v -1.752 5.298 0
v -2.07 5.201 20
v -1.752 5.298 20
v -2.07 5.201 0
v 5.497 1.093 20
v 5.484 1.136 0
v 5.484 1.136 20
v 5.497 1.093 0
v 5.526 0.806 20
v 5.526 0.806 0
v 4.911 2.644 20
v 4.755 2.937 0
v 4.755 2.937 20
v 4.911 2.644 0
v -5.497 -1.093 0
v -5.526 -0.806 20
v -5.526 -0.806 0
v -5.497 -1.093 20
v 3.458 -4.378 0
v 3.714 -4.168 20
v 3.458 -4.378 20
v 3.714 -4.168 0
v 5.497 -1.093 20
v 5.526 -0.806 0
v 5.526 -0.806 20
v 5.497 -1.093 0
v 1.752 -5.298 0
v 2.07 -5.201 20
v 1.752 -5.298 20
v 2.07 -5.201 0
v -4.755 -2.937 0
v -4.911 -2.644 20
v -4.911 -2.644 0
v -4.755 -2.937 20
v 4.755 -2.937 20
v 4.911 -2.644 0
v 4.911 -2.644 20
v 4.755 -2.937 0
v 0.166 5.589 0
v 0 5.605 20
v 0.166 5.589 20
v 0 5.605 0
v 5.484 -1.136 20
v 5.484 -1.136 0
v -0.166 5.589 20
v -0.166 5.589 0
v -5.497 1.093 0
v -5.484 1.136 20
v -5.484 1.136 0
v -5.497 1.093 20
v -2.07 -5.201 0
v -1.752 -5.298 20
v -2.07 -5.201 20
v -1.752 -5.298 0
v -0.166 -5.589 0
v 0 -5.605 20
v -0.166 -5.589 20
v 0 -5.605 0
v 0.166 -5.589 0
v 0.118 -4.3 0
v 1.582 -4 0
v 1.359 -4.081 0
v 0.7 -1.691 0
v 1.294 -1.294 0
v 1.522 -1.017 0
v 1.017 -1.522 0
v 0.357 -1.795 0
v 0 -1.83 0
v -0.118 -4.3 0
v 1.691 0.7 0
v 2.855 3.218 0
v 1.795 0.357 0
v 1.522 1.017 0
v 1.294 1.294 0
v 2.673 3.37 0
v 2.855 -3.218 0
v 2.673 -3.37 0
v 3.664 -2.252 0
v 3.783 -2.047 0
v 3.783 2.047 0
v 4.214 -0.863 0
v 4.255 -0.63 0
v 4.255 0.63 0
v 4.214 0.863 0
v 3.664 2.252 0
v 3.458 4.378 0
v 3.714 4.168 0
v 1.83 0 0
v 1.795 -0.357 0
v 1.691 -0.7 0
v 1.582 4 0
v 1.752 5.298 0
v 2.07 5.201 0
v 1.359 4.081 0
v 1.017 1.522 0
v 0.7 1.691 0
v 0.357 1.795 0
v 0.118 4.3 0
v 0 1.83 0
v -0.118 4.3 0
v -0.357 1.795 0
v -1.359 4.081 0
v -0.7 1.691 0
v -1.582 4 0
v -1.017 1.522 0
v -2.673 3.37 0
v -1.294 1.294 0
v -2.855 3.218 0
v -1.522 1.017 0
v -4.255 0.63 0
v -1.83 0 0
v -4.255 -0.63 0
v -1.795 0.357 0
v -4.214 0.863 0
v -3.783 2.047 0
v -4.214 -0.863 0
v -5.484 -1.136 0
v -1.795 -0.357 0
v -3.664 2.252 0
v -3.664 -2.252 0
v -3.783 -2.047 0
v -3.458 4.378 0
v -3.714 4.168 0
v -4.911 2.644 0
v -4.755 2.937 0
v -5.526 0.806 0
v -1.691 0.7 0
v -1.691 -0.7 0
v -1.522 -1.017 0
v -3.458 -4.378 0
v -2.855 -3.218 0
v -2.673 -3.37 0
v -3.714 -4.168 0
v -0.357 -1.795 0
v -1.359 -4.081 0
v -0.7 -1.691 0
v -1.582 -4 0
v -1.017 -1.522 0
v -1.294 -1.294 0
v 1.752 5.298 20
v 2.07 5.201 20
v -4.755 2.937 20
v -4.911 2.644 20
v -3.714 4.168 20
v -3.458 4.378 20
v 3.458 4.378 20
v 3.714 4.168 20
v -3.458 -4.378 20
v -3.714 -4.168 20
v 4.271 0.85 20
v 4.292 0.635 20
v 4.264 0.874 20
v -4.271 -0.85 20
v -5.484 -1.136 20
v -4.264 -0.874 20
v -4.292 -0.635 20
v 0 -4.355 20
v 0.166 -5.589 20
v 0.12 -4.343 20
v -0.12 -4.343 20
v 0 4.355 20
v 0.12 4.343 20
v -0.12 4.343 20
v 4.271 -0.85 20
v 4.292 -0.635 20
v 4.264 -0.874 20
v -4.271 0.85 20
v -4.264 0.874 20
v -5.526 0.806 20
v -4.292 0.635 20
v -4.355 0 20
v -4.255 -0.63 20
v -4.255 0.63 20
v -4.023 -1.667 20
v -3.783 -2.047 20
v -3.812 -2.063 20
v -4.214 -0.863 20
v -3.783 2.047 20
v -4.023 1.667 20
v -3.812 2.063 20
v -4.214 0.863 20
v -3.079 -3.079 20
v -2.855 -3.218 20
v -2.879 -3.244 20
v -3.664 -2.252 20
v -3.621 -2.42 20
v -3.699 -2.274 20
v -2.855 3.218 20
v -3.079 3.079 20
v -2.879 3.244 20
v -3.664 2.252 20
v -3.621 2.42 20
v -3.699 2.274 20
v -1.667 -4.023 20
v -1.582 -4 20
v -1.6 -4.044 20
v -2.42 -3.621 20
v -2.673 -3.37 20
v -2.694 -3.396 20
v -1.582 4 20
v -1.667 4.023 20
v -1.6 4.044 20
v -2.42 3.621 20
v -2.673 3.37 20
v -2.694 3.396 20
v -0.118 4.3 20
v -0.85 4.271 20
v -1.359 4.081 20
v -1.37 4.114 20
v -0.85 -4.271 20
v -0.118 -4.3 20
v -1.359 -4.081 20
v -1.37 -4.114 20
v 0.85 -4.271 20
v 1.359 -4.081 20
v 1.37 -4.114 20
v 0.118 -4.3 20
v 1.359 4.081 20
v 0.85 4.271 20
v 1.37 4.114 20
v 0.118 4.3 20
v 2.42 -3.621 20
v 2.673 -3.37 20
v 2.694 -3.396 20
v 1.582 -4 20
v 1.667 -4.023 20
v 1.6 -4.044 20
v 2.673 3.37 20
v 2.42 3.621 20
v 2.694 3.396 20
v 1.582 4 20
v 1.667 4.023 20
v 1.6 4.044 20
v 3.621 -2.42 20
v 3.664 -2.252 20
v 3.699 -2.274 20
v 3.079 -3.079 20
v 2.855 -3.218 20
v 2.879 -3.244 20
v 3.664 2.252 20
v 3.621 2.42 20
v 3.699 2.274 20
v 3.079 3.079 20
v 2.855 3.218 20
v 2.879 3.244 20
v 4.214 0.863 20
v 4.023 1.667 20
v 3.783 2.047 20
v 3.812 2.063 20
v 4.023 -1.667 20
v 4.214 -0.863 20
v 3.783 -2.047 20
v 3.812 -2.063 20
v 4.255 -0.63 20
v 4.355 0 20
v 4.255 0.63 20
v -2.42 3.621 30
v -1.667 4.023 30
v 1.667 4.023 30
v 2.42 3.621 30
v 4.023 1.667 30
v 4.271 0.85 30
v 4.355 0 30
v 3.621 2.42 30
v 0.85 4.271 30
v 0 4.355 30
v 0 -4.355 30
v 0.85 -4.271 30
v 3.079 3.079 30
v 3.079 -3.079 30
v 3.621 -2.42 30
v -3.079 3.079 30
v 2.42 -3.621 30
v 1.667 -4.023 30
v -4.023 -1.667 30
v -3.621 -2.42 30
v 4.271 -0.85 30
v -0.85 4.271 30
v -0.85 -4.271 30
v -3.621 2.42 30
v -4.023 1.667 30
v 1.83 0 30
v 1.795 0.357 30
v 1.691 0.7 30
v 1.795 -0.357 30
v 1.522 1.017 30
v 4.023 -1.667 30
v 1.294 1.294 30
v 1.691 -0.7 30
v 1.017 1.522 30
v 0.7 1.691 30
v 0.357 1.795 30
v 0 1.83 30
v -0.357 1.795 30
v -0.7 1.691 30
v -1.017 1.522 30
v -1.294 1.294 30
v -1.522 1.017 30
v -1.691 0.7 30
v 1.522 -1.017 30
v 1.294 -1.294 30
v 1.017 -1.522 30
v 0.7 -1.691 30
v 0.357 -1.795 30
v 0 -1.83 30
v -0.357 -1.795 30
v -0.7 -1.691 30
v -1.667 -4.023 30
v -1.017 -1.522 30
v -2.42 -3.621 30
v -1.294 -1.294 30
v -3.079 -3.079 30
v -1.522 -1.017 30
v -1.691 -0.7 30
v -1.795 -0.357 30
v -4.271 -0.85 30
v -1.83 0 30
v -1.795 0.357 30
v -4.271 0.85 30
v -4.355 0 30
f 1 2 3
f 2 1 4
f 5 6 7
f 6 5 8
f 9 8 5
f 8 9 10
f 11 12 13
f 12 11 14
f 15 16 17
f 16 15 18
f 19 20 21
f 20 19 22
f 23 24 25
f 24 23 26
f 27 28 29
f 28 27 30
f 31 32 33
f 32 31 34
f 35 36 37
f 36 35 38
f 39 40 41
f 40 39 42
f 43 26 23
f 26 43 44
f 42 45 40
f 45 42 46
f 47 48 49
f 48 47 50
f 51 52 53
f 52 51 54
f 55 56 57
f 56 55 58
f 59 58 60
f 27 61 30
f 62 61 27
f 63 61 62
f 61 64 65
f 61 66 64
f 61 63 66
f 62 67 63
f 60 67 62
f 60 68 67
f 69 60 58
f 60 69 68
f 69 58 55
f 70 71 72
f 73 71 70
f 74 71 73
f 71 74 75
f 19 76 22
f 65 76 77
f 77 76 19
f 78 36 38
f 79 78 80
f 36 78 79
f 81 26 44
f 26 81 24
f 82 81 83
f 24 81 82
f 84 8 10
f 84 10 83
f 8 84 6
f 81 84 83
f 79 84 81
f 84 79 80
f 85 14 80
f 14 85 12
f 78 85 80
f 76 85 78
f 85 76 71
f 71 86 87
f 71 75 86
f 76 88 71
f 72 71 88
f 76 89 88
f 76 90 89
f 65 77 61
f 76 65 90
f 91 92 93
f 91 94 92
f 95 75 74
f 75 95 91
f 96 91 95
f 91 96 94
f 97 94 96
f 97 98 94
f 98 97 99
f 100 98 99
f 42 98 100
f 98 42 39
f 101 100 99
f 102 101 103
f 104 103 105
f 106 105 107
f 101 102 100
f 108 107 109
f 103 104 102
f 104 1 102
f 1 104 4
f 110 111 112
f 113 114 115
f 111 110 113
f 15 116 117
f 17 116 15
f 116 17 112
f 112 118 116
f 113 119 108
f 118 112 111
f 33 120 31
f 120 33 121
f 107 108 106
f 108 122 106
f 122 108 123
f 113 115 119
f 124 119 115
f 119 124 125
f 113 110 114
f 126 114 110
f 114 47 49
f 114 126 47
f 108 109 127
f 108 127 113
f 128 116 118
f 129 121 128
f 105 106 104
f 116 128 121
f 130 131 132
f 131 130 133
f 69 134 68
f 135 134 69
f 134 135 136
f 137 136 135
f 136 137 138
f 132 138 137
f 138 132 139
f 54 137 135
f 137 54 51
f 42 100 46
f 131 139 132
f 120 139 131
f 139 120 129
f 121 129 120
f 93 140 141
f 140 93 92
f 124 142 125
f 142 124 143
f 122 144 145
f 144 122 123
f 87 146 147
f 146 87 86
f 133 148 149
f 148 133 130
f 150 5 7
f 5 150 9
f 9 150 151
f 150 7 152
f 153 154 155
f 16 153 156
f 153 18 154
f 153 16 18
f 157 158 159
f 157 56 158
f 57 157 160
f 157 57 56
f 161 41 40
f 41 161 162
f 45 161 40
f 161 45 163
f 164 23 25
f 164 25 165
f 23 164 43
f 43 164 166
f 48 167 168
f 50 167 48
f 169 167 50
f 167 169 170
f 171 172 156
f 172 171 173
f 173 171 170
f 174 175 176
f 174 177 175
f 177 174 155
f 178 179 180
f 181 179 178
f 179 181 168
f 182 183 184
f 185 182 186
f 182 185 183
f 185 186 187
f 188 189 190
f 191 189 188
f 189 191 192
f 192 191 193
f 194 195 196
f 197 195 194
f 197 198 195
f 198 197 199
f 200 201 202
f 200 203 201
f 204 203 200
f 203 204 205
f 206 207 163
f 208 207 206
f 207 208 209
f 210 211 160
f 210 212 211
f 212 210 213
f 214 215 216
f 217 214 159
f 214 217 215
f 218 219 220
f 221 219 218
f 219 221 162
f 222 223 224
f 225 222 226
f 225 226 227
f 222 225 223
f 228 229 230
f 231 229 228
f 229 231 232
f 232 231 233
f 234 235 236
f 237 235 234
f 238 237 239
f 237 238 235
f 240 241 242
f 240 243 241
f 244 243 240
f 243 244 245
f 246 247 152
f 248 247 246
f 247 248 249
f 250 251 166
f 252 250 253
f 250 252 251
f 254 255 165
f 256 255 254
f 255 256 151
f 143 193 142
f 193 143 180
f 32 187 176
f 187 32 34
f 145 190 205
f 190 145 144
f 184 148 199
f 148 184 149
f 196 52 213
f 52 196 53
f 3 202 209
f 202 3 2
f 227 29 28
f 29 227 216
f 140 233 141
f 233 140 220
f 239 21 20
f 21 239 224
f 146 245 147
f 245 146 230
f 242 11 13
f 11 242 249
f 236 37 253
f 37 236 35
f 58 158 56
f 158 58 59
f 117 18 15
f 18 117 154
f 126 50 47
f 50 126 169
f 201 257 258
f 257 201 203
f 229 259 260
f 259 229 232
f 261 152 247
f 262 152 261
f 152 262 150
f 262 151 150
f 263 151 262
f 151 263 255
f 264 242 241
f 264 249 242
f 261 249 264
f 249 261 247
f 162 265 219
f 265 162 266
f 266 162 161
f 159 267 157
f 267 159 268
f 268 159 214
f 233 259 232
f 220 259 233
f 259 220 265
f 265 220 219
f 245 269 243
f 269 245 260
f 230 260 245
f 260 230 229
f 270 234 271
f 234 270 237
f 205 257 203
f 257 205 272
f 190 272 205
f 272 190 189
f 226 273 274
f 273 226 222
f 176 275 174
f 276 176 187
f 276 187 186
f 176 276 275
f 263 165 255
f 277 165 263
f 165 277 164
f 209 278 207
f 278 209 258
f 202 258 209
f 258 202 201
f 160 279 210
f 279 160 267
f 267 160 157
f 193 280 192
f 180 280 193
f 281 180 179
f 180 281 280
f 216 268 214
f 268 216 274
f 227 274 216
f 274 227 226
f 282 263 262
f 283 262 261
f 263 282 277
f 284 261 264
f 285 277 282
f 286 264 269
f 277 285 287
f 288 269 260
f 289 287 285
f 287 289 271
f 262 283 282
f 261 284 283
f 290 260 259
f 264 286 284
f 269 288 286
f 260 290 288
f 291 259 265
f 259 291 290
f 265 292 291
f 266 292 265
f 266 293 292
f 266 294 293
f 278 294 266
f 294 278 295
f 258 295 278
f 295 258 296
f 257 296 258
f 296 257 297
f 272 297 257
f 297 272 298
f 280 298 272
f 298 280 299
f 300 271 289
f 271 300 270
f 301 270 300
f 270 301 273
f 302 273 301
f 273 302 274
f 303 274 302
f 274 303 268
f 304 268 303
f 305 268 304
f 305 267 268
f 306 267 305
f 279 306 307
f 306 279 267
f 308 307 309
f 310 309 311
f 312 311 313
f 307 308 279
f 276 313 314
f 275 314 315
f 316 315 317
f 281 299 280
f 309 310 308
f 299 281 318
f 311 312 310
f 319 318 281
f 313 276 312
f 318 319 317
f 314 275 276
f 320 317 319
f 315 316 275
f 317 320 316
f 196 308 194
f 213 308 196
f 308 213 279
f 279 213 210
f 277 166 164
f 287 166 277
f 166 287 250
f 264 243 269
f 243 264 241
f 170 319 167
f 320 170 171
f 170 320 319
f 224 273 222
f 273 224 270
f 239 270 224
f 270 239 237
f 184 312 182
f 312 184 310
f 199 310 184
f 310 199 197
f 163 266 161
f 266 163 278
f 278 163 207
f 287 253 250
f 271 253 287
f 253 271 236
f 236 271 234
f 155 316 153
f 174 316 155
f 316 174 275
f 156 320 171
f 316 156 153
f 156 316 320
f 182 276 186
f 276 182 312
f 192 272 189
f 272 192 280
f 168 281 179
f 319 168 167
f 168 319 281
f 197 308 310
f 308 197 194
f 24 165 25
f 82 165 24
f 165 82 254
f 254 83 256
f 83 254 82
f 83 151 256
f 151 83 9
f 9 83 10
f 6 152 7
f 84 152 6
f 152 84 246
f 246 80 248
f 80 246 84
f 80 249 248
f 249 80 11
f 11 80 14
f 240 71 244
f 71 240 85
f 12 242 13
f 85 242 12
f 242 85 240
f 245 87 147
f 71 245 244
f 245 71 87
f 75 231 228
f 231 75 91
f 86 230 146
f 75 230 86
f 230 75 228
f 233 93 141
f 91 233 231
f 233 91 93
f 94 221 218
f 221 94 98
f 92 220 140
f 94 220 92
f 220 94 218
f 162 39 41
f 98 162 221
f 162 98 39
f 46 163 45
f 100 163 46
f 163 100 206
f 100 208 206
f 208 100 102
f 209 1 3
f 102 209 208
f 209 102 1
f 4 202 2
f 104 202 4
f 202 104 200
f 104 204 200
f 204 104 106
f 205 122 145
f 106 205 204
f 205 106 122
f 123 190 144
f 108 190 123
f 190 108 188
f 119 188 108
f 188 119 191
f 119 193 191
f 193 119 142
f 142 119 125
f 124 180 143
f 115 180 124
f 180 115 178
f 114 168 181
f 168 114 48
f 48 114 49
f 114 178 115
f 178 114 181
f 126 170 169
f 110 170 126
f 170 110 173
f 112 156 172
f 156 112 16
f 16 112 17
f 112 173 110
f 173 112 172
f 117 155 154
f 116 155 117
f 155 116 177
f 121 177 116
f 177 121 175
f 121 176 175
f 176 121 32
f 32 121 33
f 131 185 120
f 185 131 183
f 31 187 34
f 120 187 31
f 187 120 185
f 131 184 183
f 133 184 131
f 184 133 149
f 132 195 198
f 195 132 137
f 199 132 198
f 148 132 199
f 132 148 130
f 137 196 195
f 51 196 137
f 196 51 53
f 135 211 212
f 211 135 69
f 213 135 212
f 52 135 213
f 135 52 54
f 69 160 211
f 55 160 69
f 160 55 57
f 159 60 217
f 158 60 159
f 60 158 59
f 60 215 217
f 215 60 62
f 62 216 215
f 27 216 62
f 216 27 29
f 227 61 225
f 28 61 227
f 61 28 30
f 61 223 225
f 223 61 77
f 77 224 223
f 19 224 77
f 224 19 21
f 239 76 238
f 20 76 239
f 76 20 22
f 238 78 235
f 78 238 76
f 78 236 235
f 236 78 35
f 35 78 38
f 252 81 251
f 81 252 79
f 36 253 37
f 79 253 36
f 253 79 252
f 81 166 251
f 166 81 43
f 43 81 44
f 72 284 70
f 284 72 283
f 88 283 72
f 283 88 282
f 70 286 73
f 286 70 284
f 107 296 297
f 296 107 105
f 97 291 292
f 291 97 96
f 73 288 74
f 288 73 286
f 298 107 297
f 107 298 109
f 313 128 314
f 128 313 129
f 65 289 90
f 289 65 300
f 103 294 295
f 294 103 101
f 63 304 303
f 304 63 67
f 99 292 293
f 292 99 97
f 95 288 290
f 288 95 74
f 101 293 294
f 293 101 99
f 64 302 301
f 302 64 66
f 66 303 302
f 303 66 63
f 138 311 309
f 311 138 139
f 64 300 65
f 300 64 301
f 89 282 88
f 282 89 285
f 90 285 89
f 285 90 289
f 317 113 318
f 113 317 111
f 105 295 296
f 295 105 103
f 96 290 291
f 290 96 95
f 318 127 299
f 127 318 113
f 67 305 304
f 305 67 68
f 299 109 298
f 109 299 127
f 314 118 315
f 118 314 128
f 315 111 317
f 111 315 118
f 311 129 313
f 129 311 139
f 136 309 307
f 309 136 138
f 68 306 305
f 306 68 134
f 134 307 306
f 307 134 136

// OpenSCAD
$fn = 32;

// ----------------------------------------------------------------------
// Timing pulley: GT2 18T, pitch 2 mm, 11.21 mm x 30 mm
// ----------------------------------------------------------------------

// --- parameters (mm) ---
pitch_mm = 2;             // belt pitch
tooth_count = 18;         // number of grooves
width = 20;               // belt width between the flanges
tip_d = 11.21;            // tip circle diameter
root_d = 9.71;            // groove bottom diameter
groove_h = 0.75;          // groove depth
tooth_w = 1.5;            // groove width at the tip circle
hub_bore = 3.66;          // shaft bore
hub_d = 8.71;             // hub diameter
hub_h = 10;               // hub above the flange
bottom_z = 0;             // lowest point of the pulley
top_z = 30;               // highest point of the pulley

module rim() {
  cylinder(h = width, d = tip_d);
}

module groove_cutter() {
  /* belt tooth groove: deeper than wide, cut through the belt width */
  translate([root_d / 2, 0, 0])
    linear_extrude(height = width)
      polygon(points = [[-0.6, -tooth_w * 0.42], [groove_h + 0.6, -tooth_w * 0.6],
                        [groove_h + 0.6, tooth_w * 0.6], [-0.6, tooth_w * 0.42]]);
}

module hub() {
  translate([0, 0, bottom_z]) cylinder(h = top_z - bottom_z, d = hub_d);
}

difference() {
  union() {
    rim();
    hub();
  }
  for (i = [0 : tooth_count - 1]) rotate([0, 0, i * 360 / tooth_count]) groove_cutter();
  translate([0, 0, bottom_z - 1]) cylinder(h = top_z - bottom_z + 2, d = hub_bore);
}
